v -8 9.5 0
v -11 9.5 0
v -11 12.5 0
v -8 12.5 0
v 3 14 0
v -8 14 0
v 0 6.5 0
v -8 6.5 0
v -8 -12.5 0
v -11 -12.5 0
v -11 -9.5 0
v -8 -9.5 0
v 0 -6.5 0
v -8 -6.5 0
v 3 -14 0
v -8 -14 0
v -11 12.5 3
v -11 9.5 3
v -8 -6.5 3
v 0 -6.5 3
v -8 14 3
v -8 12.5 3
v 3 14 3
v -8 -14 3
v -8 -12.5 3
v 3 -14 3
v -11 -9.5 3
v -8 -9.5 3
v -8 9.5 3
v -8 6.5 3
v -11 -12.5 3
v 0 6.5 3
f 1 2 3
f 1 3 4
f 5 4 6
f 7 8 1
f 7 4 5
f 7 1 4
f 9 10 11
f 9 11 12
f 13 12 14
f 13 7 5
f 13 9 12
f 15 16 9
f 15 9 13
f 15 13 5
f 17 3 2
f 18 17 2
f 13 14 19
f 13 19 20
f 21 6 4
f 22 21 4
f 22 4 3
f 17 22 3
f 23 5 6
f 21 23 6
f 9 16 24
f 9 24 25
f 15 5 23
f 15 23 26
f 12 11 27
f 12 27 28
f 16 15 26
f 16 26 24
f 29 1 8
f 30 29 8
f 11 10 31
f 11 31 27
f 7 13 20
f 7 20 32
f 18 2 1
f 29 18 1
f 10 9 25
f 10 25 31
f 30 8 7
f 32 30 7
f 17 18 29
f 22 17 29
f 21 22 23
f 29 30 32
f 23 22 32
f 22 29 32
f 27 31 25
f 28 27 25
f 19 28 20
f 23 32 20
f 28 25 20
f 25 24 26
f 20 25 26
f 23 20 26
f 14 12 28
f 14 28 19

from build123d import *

# Parameters (mm, degrees)
SALIENTE_EXTRUIR1_DEPTH = 3


with BuildPart() as part:
    # Croquis1 → Saliente-Extruir1 (new body)
    with BuildSketch(Plane.XY):
        Polygon((-8, 12.5), (-11, 12.5), (-11, 9.5), (-8, 9.5), (-8, 6.5), (0, 6.5), (0, 0), (3, 0), (3, 14), (-8, 14), align=None)
    saliente_extruir1 = extrude(amount=SALIENTE_EXTRUIR1_DEPTH)

    # Simetría1: Saliente-Extruir1 across plane
    add(saliente_extruir1.mirror(Plane(origin=(0, 0, 3), x_dir=(0, 0, 1), z_dir=(0, 1, 0))))


solid = part.part
